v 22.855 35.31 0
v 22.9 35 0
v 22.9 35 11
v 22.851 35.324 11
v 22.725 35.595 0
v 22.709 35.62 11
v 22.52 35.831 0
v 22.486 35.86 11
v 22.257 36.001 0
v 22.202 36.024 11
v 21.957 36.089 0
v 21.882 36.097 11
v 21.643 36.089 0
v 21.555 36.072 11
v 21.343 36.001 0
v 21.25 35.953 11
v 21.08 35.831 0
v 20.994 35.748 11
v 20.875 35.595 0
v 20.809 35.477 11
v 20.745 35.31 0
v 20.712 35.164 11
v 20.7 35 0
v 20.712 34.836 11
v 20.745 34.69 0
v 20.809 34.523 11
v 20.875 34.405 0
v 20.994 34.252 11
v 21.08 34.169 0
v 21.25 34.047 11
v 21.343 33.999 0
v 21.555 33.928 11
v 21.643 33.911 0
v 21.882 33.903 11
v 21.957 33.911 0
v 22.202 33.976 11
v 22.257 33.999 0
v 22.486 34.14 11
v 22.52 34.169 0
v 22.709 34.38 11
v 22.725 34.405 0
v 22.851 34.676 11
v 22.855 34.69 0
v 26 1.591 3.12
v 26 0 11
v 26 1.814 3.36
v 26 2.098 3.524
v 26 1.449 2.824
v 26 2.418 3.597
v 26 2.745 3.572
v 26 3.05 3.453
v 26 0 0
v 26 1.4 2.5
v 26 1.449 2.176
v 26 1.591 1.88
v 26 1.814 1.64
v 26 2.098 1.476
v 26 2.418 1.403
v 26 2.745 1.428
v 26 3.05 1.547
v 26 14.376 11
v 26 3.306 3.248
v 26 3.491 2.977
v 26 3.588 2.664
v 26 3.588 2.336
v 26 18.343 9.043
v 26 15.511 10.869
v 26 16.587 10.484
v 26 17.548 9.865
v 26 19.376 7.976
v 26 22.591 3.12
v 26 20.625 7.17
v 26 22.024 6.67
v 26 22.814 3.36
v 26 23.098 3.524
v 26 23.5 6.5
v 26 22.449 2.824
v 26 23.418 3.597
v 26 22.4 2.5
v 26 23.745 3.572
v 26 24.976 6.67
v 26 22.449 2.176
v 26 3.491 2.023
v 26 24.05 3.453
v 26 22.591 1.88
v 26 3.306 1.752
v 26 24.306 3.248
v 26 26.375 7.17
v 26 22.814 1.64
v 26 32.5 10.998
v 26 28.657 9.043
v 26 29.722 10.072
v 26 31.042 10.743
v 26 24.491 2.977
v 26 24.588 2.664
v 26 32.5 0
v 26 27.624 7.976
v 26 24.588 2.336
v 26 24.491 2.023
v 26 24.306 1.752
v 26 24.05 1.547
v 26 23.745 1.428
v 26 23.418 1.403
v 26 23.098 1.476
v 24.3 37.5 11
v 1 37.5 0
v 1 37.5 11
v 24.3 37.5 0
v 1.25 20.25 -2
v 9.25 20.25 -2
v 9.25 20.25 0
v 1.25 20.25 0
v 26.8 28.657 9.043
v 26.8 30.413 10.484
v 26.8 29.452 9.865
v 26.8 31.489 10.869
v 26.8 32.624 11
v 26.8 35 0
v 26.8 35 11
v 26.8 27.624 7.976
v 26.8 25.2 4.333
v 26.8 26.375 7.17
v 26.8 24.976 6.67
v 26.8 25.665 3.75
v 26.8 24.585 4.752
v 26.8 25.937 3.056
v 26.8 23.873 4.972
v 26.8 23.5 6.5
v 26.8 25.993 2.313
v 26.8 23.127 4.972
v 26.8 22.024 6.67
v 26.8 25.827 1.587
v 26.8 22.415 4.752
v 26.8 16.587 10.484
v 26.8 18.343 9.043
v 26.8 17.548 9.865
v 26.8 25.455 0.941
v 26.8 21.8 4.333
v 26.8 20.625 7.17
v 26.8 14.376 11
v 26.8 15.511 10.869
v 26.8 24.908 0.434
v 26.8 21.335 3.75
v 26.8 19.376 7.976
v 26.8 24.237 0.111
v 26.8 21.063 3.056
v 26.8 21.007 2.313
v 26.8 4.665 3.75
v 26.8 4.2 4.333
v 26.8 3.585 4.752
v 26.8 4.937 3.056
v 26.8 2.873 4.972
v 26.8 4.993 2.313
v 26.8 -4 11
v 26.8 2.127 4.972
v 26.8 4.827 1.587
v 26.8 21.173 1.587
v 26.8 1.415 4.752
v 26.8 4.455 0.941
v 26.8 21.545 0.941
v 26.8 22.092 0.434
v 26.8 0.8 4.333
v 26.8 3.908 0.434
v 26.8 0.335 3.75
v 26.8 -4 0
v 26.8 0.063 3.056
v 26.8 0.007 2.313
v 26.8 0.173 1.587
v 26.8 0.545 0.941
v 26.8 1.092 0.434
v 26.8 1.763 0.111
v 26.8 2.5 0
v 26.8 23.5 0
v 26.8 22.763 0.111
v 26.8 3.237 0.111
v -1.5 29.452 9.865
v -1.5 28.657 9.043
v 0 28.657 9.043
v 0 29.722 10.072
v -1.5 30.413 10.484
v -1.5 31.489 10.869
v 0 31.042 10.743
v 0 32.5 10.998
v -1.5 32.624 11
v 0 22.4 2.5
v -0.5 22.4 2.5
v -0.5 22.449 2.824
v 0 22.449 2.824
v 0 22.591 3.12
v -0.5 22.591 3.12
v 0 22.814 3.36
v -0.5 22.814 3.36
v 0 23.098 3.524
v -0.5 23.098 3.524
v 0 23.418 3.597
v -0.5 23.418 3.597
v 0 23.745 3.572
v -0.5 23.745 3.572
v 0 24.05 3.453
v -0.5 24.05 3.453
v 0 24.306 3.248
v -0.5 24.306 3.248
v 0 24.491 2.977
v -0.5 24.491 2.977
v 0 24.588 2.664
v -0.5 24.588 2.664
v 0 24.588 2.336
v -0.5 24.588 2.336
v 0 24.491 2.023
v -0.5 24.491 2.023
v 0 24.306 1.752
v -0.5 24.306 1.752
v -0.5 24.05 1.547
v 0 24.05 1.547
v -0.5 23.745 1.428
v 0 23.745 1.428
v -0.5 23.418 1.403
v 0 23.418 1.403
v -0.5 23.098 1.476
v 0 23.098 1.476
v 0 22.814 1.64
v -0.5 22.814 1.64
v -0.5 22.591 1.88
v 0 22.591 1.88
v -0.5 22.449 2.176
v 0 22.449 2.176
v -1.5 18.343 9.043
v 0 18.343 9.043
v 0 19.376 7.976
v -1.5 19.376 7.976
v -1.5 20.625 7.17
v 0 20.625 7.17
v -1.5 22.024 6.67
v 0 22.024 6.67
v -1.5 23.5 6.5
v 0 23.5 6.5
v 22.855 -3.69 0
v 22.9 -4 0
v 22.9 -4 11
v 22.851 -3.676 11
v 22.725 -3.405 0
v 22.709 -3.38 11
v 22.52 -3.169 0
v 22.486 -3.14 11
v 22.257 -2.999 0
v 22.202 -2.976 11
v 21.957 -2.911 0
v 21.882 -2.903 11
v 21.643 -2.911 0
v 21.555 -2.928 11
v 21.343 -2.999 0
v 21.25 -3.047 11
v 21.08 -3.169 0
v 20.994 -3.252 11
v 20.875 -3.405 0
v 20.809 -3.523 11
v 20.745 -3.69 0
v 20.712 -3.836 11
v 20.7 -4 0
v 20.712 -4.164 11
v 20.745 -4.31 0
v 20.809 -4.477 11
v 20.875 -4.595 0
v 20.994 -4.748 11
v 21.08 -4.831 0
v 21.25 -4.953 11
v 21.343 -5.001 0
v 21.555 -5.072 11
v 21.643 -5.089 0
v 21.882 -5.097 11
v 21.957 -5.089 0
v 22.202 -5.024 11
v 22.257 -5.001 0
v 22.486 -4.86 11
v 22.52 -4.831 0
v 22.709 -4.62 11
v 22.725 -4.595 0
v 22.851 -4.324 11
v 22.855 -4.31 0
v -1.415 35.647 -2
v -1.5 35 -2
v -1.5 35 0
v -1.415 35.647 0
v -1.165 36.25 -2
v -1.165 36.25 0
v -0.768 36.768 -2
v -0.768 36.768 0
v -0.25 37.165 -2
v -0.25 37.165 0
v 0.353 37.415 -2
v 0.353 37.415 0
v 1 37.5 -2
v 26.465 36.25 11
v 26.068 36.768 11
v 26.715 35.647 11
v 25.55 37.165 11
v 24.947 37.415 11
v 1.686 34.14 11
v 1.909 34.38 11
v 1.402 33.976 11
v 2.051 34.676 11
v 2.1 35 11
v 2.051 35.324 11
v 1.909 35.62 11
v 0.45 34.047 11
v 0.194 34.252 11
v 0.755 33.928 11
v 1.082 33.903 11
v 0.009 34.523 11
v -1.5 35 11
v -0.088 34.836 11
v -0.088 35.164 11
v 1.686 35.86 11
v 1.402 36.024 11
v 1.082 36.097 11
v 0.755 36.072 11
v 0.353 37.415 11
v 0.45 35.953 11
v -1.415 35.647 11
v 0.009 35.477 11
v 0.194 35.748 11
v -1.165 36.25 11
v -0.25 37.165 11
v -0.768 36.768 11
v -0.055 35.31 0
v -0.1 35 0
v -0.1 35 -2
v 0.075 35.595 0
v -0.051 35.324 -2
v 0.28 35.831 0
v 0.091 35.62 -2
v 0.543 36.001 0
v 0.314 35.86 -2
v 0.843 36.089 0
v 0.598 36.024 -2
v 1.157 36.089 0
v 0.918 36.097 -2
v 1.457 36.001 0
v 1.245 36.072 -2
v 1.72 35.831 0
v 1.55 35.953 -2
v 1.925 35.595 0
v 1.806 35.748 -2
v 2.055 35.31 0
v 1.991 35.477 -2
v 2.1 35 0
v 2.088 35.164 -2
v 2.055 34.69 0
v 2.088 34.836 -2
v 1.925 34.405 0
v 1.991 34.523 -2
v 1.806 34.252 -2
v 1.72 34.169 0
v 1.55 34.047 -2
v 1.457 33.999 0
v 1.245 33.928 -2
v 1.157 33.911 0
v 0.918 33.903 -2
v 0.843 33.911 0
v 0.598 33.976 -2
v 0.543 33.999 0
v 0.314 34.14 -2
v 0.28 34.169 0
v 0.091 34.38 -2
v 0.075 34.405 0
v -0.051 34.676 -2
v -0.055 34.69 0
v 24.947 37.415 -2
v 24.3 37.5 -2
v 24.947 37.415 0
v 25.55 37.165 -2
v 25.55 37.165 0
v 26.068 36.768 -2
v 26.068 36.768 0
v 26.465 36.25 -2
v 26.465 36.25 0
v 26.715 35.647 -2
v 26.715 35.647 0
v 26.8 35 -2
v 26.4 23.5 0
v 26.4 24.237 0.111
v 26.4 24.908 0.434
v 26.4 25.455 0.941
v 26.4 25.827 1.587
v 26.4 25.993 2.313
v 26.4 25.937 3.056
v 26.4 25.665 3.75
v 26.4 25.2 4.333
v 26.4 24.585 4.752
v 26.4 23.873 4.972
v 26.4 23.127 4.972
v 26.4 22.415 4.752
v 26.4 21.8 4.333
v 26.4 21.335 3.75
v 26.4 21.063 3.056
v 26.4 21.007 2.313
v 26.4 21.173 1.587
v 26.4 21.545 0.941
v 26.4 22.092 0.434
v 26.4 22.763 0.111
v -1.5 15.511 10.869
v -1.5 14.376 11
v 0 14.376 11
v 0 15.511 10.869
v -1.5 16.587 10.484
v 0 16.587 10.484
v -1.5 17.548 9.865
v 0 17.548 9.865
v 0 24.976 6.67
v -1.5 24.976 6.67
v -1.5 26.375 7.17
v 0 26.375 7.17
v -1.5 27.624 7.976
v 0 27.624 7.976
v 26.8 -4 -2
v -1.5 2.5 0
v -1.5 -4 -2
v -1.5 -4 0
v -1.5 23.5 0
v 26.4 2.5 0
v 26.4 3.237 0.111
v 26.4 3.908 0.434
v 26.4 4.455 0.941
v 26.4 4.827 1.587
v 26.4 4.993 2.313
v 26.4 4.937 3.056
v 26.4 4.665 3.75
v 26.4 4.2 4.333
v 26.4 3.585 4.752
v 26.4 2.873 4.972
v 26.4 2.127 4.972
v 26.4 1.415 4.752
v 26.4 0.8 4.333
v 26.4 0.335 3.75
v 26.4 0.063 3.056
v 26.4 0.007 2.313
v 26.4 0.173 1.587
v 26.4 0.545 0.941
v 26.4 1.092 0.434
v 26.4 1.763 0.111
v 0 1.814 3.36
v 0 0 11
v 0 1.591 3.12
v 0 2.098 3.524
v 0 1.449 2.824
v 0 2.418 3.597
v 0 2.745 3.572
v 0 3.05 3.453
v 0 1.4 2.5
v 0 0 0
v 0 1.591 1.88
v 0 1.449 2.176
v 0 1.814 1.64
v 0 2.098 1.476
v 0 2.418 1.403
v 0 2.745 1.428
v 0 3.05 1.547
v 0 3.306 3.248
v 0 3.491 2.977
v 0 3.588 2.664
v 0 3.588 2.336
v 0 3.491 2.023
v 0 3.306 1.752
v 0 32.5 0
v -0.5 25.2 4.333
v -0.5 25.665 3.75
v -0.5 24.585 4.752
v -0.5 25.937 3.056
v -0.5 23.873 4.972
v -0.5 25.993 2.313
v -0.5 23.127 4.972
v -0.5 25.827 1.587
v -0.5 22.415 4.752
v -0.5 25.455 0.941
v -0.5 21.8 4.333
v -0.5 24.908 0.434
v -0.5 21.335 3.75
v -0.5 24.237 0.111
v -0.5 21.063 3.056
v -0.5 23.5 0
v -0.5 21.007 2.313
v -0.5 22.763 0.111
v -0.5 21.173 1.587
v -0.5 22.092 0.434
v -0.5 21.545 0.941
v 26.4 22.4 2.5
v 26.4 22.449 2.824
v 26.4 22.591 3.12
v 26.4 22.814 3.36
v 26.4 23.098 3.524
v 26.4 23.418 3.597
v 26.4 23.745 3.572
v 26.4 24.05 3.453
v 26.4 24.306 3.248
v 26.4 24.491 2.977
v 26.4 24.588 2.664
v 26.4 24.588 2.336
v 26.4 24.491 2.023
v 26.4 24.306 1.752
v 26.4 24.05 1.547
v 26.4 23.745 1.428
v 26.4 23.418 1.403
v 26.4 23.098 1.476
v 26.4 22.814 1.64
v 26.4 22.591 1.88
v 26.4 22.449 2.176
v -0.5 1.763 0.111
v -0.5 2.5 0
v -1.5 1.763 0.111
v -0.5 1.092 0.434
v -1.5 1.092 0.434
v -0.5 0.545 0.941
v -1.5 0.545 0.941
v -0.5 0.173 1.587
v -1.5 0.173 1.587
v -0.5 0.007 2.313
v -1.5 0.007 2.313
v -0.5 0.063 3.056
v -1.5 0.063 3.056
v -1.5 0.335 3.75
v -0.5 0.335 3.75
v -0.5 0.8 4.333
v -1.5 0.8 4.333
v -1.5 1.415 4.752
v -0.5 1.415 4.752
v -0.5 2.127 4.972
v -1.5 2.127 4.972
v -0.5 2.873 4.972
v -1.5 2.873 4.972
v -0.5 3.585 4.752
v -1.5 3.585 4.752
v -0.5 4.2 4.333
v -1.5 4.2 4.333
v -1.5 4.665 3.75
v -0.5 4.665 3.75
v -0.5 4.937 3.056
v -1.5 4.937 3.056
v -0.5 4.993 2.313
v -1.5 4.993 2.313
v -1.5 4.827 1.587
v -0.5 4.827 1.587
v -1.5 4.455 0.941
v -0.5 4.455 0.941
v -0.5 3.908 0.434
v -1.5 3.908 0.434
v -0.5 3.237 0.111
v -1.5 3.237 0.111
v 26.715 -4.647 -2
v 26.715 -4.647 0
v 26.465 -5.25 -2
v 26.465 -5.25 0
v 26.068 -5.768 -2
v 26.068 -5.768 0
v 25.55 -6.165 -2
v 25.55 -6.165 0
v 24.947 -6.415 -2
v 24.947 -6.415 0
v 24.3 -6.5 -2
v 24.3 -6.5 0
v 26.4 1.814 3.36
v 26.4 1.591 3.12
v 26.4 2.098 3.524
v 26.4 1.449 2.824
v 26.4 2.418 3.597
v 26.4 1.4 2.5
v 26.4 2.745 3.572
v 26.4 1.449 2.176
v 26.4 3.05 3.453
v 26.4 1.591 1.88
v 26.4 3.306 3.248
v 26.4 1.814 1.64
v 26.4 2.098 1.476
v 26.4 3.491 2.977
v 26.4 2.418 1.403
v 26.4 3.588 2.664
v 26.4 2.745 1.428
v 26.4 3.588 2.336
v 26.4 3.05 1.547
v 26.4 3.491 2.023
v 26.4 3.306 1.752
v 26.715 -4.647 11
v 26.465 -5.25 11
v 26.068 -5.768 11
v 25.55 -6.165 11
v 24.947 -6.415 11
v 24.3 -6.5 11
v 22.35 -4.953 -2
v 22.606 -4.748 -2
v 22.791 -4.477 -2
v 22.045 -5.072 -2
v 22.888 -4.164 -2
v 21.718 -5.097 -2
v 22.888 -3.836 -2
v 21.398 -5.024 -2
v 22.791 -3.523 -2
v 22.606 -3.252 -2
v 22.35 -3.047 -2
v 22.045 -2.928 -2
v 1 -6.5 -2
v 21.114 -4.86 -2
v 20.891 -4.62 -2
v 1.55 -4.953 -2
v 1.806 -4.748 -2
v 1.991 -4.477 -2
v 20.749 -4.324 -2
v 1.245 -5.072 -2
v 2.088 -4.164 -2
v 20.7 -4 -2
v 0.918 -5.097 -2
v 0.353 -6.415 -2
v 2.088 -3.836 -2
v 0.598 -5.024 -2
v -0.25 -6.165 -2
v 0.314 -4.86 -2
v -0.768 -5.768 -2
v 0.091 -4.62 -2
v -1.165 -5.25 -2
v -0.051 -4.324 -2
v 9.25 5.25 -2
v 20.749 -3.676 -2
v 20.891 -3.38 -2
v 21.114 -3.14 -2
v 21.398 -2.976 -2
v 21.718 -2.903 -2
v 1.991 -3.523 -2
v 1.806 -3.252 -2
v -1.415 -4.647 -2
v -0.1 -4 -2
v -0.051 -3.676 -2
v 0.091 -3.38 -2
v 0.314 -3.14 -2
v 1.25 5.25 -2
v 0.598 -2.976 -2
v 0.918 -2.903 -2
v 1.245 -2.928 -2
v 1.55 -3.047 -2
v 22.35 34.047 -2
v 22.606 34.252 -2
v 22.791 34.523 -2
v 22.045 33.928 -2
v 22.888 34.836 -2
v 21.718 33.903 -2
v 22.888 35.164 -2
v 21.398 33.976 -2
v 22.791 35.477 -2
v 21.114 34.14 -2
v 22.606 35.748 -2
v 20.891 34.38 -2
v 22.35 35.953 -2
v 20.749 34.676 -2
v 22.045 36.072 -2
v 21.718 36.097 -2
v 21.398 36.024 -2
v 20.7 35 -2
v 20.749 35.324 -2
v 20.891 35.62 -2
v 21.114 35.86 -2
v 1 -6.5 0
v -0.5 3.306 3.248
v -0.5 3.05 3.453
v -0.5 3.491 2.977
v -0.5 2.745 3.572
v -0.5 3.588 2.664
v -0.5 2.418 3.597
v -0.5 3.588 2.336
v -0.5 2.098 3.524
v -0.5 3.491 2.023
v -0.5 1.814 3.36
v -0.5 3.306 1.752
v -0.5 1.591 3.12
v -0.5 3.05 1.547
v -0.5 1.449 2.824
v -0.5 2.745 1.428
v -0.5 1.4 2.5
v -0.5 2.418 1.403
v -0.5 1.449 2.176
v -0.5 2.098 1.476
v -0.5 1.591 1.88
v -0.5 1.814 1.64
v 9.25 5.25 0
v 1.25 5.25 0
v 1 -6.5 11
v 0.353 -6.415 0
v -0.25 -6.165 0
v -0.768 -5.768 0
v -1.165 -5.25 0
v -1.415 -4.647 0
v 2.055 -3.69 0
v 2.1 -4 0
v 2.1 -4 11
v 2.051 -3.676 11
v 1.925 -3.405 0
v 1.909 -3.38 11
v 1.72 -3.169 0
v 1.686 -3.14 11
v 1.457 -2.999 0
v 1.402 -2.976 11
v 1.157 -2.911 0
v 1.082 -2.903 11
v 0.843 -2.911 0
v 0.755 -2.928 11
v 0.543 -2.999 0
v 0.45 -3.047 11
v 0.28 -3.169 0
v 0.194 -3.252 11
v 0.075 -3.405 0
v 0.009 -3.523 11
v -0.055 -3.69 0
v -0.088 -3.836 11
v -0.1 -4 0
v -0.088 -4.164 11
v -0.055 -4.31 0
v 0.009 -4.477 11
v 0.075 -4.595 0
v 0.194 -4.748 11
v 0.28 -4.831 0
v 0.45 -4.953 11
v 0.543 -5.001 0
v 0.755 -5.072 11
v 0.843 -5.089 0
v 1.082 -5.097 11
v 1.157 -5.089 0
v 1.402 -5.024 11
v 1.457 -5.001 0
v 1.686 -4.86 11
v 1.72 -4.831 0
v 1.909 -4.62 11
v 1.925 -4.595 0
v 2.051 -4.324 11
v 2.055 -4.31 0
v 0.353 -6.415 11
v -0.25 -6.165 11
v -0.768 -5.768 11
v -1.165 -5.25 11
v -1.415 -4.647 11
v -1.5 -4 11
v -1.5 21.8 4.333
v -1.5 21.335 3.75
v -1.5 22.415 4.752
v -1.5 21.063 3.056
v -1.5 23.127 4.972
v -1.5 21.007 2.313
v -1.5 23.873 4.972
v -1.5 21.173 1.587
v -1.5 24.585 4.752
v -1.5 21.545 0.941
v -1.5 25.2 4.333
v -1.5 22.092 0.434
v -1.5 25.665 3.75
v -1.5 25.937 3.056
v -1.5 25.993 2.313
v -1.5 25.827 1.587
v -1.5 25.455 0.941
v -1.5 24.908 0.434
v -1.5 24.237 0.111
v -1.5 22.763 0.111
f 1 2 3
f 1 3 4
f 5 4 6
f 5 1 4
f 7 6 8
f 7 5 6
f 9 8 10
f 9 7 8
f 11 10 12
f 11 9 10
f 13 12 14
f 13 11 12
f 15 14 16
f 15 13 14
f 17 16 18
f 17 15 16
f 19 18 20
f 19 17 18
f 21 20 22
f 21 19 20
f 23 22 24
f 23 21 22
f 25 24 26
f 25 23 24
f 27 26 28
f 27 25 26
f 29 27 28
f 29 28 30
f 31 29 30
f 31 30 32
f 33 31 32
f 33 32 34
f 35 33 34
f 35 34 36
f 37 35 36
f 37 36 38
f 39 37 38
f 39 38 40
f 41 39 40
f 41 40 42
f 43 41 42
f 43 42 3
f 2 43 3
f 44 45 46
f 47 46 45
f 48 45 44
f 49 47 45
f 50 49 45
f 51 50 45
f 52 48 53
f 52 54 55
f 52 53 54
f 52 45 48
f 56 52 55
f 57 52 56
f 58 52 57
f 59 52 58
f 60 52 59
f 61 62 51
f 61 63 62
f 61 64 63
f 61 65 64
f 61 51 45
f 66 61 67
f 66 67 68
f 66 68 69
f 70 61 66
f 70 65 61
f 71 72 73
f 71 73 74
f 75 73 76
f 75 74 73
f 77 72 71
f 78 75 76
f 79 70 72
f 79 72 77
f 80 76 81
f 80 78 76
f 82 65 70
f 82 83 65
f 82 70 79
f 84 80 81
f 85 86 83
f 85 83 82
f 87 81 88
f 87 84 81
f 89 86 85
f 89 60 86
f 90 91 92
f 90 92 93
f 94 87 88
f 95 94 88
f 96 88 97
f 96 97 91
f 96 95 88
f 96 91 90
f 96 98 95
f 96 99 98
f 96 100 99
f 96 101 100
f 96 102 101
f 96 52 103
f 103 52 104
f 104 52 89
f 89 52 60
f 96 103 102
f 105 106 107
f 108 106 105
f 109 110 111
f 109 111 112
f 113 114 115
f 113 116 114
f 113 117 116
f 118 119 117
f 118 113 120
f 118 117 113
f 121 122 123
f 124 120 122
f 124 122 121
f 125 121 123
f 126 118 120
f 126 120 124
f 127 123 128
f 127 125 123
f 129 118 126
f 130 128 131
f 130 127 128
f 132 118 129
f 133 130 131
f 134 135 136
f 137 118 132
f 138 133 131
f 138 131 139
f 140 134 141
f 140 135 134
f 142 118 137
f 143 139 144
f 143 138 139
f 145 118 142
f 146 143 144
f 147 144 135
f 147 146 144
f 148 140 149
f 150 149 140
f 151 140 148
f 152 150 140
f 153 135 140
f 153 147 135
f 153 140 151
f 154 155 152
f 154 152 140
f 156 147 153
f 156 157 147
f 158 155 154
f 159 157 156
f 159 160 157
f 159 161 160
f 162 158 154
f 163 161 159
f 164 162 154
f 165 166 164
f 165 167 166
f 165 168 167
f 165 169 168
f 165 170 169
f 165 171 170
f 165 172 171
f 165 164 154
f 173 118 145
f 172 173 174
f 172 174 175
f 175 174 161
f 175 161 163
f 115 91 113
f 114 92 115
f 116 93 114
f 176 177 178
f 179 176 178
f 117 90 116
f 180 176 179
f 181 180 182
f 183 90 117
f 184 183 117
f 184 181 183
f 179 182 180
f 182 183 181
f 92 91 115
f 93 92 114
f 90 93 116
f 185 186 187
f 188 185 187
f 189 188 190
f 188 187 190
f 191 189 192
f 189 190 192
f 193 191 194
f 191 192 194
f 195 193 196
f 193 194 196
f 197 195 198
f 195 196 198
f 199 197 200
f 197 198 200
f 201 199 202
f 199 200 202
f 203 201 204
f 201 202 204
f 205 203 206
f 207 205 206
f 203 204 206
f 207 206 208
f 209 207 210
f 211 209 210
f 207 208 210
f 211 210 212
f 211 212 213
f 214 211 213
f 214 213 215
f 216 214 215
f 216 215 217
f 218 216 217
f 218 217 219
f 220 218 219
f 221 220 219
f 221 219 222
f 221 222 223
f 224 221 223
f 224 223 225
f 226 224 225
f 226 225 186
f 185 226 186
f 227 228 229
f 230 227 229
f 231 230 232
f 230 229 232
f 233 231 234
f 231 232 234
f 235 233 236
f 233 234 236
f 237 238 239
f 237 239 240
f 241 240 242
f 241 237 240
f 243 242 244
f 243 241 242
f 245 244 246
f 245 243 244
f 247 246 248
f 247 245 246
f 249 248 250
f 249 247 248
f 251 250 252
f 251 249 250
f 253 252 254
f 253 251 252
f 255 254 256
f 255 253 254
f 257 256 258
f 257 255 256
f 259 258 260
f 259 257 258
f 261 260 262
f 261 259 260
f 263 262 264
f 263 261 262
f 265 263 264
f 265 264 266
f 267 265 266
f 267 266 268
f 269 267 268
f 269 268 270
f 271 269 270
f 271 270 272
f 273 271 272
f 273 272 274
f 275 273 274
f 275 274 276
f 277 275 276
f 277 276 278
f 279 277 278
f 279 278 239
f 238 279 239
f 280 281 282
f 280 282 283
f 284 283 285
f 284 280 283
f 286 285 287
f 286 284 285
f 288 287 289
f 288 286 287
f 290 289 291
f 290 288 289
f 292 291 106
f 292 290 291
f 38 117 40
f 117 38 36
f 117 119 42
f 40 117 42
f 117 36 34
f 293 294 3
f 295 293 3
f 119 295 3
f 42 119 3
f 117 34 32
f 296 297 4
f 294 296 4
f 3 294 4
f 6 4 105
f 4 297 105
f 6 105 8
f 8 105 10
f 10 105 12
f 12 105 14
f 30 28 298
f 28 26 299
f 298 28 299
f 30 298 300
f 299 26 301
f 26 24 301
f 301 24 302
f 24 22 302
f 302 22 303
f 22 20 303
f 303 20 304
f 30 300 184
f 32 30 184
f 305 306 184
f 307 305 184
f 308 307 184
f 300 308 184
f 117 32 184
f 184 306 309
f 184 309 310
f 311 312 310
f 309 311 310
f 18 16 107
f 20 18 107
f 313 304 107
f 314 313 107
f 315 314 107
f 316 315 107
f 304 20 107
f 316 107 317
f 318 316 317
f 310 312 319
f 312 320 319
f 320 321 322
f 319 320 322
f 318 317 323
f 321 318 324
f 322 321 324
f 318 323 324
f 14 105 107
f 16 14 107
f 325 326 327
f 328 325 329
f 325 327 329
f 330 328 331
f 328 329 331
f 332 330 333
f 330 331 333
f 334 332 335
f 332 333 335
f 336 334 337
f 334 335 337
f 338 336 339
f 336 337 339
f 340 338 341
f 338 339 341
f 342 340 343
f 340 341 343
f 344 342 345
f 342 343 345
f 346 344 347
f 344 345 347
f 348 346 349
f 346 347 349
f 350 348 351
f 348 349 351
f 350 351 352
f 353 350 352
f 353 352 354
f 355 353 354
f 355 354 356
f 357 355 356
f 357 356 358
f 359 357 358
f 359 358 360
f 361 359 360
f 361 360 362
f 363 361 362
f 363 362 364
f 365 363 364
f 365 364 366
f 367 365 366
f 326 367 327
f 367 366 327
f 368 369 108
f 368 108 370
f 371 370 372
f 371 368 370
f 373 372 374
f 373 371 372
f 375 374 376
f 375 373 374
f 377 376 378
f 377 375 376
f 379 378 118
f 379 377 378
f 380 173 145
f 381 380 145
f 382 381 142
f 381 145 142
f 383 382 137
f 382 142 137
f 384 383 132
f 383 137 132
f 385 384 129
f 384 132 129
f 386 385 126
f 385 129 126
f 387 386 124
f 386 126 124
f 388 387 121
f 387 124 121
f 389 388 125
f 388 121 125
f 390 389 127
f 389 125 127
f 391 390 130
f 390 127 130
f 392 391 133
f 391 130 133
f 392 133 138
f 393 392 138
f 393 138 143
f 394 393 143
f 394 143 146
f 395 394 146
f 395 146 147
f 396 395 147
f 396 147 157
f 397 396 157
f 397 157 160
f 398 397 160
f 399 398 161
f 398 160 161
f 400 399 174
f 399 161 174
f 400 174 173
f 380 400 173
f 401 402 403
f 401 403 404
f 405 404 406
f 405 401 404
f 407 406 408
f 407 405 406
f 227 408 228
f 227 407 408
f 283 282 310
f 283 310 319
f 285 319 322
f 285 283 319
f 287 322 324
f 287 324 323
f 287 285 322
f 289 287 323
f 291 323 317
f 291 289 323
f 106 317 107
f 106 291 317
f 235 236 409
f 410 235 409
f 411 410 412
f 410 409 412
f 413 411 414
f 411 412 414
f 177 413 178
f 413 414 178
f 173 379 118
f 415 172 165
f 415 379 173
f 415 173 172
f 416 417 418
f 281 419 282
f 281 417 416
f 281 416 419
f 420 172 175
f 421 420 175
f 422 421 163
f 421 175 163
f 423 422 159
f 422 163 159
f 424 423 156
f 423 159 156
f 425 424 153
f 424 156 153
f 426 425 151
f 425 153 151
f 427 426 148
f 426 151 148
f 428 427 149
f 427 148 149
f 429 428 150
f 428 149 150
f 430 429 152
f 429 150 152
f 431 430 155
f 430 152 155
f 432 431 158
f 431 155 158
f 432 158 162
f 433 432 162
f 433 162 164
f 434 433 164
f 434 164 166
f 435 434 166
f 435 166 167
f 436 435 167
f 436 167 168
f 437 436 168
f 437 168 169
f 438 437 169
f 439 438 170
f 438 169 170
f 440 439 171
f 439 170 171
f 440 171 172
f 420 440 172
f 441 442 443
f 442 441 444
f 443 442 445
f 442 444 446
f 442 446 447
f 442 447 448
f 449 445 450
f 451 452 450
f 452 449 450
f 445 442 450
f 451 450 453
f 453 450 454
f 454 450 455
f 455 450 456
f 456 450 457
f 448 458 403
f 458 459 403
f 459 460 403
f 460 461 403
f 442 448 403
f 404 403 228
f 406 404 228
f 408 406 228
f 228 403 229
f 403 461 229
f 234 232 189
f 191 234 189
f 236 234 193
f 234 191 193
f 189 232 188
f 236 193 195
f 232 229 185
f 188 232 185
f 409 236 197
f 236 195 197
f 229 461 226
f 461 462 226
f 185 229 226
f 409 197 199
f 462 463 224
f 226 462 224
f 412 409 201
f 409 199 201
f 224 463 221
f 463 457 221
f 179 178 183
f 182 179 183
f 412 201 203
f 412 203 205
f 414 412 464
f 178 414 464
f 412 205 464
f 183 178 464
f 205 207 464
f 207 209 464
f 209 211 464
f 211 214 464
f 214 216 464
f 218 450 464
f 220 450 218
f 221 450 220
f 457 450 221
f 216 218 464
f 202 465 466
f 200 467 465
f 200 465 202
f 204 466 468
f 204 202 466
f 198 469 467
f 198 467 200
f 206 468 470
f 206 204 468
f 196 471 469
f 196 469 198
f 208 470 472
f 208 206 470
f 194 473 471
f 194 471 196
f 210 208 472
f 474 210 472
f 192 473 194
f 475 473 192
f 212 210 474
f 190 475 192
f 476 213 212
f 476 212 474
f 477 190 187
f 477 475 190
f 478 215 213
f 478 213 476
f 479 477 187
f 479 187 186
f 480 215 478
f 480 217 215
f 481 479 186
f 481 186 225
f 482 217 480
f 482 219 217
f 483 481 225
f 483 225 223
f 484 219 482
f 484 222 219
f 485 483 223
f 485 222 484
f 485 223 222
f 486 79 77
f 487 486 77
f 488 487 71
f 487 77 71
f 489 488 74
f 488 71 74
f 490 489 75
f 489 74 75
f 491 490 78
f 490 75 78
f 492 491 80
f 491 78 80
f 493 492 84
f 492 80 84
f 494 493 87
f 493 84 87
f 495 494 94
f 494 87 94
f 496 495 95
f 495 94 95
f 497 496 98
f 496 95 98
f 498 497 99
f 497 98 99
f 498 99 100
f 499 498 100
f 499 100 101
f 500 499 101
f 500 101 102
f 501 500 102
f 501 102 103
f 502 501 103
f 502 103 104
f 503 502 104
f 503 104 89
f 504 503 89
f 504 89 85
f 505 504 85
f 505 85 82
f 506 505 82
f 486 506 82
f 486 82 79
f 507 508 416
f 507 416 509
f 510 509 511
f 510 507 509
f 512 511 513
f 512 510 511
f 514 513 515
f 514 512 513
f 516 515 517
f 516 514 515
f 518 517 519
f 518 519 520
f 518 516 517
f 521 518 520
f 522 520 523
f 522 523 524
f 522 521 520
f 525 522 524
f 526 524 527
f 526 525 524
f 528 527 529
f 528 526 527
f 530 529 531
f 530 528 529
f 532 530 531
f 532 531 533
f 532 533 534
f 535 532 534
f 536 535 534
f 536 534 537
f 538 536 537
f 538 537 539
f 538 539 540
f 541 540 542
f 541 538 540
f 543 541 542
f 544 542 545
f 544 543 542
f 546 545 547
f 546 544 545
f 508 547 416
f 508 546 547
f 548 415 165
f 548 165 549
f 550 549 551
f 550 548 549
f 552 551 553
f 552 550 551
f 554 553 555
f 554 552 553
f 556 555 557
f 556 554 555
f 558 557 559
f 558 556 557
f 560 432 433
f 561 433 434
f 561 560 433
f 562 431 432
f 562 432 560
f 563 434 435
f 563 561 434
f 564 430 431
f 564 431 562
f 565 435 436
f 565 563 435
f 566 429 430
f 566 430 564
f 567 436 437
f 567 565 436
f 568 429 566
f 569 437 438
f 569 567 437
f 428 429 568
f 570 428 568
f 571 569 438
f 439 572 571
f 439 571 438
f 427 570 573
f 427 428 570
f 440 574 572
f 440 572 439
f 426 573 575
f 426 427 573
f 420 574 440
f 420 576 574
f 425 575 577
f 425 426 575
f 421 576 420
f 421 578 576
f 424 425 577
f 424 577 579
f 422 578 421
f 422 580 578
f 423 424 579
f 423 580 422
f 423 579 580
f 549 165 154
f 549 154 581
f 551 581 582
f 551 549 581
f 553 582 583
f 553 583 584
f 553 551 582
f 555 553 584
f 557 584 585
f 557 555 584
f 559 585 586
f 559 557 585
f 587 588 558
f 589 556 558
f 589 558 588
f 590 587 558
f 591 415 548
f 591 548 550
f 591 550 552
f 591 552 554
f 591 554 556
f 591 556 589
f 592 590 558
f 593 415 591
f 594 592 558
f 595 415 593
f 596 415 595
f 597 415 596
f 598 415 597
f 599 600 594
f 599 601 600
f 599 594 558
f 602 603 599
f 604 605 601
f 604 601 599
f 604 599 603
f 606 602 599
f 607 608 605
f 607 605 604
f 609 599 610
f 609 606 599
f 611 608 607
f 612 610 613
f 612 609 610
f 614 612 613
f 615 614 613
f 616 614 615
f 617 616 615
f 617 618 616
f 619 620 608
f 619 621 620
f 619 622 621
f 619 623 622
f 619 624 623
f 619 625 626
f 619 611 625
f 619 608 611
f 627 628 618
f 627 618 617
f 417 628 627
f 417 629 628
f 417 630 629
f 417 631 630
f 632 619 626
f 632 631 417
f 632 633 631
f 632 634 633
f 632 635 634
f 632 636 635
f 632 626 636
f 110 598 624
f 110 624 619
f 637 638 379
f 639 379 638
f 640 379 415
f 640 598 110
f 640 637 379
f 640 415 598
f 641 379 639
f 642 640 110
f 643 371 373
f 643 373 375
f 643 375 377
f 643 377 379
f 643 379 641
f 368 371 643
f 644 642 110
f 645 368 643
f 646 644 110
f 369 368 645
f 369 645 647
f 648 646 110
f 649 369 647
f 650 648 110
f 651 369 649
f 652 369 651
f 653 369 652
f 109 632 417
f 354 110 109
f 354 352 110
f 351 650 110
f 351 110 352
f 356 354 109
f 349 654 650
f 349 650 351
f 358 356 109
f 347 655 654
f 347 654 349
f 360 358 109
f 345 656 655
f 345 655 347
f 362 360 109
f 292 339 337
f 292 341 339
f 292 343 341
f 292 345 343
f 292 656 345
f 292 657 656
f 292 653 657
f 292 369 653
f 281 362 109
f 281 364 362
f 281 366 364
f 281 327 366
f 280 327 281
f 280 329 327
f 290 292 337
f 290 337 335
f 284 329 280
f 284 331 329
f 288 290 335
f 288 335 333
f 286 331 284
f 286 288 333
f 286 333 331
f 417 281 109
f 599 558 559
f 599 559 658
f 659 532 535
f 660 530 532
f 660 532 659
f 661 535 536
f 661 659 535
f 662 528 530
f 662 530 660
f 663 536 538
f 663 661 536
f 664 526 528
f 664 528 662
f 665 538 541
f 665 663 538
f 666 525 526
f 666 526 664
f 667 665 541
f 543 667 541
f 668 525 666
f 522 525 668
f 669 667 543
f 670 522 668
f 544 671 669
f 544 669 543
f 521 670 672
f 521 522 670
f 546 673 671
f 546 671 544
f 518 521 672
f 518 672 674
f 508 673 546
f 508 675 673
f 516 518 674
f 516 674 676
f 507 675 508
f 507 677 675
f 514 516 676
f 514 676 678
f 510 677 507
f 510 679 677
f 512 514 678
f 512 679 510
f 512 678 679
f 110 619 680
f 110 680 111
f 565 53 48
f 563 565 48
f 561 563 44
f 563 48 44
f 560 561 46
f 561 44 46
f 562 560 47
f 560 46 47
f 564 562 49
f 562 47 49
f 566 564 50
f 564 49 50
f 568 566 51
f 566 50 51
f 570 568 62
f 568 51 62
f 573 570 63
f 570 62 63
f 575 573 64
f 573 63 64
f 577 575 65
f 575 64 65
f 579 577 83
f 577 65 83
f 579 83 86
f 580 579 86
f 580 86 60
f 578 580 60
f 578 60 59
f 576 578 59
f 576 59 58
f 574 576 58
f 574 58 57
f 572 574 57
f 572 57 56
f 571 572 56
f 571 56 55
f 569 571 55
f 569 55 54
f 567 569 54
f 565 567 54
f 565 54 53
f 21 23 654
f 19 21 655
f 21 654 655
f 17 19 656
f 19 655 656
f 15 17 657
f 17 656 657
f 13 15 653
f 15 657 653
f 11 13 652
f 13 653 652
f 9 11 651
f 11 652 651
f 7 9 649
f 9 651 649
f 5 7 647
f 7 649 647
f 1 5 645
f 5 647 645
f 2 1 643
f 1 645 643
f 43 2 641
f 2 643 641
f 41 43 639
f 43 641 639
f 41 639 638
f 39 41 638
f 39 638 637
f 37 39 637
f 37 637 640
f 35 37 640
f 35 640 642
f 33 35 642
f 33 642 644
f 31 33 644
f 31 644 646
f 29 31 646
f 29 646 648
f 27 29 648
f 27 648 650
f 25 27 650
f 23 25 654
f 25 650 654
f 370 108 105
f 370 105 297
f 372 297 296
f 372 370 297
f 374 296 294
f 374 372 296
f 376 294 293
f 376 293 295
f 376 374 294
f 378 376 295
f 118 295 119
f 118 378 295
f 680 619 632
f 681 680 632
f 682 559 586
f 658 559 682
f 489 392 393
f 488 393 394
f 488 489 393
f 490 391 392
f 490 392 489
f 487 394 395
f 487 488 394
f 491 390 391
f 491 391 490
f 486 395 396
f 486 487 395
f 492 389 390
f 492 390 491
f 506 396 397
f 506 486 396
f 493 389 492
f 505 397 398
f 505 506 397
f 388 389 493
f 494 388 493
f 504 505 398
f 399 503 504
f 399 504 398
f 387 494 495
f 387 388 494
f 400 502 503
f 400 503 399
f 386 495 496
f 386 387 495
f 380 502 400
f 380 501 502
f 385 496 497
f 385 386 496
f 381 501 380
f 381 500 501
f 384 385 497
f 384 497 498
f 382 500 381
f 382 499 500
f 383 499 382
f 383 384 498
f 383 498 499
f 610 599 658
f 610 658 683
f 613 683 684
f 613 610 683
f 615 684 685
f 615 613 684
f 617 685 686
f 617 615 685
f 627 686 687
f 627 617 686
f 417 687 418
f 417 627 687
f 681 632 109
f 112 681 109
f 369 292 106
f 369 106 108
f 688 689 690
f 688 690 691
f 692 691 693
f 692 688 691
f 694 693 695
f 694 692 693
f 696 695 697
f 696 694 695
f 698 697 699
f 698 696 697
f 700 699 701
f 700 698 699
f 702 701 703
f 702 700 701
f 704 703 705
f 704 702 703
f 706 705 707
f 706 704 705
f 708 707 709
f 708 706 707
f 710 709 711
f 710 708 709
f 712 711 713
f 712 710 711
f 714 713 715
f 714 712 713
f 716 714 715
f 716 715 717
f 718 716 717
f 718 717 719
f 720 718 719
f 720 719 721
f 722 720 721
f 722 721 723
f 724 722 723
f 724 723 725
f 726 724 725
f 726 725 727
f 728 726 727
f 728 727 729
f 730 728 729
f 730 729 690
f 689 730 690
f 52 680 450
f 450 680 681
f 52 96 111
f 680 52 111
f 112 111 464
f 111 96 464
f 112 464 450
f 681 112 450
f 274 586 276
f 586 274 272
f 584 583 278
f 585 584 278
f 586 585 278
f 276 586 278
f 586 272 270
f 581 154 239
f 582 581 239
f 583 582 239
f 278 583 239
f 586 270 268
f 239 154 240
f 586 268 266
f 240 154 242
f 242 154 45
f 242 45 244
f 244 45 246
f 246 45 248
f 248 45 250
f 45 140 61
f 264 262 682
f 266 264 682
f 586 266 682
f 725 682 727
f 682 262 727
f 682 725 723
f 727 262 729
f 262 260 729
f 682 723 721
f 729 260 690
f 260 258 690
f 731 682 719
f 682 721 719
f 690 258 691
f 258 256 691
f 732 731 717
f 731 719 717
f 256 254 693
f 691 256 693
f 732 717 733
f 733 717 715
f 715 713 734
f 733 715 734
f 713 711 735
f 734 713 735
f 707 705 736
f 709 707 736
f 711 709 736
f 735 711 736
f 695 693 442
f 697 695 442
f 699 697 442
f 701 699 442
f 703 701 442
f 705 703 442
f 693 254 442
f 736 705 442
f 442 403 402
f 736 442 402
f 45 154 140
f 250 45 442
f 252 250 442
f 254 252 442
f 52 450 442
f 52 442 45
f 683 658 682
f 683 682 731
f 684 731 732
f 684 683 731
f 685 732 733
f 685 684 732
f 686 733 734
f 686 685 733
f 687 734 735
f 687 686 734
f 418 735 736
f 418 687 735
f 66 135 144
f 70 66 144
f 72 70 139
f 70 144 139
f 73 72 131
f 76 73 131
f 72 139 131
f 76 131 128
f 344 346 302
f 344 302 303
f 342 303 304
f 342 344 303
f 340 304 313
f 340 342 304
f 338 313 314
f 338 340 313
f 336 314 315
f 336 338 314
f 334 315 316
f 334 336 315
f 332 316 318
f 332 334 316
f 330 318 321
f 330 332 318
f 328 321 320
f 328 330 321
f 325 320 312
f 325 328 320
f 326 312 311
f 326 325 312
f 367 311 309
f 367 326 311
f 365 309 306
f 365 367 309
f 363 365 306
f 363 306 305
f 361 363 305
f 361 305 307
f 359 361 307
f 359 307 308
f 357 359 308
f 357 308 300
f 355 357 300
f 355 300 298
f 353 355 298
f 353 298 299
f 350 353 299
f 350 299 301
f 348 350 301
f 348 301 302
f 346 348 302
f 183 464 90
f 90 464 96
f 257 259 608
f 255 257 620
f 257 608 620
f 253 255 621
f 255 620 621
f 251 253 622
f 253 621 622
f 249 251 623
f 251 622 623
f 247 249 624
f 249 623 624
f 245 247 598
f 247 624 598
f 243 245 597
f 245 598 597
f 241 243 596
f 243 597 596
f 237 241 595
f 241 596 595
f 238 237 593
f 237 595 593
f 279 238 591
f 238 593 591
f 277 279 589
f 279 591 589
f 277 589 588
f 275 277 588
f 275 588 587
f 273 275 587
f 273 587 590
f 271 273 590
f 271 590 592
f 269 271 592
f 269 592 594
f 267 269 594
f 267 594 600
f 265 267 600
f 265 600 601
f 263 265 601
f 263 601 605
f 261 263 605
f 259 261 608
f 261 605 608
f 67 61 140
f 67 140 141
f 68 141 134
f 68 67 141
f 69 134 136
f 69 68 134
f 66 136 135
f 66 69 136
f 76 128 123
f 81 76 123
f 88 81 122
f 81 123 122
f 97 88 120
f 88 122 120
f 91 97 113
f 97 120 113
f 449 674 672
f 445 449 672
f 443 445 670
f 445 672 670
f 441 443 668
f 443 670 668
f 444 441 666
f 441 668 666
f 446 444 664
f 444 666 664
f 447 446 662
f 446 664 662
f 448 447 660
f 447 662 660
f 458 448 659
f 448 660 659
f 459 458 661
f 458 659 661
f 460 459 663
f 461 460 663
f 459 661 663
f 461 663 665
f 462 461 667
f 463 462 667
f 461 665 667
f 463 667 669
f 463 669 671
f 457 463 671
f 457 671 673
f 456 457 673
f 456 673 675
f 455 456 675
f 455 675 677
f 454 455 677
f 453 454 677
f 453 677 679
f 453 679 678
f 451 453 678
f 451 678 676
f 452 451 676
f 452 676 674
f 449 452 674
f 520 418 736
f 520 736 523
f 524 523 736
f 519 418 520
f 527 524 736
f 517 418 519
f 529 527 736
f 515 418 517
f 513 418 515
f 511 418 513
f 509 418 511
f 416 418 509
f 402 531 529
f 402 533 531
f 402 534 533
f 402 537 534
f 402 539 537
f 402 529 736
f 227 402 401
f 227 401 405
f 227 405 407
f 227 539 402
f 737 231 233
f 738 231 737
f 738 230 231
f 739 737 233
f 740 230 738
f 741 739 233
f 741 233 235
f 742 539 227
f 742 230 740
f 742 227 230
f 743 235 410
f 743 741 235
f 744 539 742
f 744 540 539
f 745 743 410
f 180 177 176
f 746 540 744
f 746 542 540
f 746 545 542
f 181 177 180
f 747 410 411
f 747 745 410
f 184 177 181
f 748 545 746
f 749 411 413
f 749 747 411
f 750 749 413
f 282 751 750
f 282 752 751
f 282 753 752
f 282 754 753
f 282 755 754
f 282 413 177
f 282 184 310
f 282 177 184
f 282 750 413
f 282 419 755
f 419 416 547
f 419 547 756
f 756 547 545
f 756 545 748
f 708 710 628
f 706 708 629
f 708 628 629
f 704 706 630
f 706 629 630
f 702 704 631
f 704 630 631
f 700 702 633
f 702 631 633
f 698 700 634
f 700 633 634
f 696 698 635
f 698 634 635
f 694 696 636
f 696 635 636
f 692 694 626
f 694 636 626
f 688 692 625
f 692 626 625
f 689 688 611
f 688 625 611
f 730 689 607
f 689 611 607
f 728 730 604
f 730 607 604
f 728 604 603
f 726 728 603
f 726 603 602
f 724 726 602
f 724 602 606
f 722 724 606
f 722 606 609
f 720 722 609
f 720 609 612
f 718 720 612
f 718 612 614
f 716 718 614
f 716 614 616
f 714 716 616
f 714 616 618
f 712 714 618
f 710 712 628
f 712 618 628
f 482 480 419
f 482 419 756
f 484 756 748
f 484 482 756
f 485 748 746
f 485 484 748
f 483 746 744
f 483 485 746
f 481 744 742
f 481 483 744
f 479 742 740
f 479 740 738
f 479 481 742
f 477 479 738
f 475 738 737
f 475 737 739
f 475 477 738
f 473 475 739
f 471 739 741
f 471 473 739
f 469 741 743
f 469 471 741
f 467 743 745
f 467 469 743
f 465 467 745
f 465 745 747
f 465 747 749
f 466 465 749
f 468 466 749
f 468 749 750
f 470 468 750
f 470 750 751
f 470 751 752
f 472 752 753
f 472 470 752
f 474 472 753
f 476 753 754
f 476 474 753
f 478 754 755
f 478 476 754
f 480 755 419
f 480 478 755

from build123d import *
from build123d.topology import SkipClean

# Parameters (mm, degrees)
SKETCH_1_R          = 1.1
SKETCH_1_W          = 26
SKETCH_1_H          = 32.5
EXTRUDE_1_DEPTH     = 11
EXTRUDE_START       = 2
SKETCH_3_R          = 1.1
EXTRUDE_2_DEPTH     = 2
SKETCH_2_R          = 1.1
CUT_EXTRUDE_1_DEPTH = 49.250803102
SKETCH_4_W          = 8
SKETCH_4_H          = 15
CUT_EXTRUDE_3_DEPTH = 10
SKETCH_5_R          = 6.5
CUT_EXTRUDE_4_DEPTH = 49.250803102
FILLET_START        = -2
FILLET_1_DEPTH      = 30
SKETCH_6_R          = 2.5
CUT_EXTRUDE_5_DEPTH = 0.4
CUT_EXTRUDE_START   = -1
SKETCH_7_R          = 2.5
CUT_EXTRUDE_6_DEPTH = 1


with BuildPart() as part:
    # ｽｹｯﾁ1 → ﾎﾞｽ - 押し出し1 (new body)
    with BuildSketch(Plane.XY):
        with BuildLine():
            Line((26.8, 35), (26.8, -4))
            ThreePointArc((26.8, -4), (26.067766953, -5.767766953), (24.3, -6.5))
            Line((24.3, -6.5), (1, -6.5))
            ThreePointArc((1, -6.5), (-0.767766953, -5.767766953), (-1.5, -4))
            Line((-1.5, -4), (-1.5, 35))
            ThreePointArc((-1.5, 35), (-0.767766953, 36.767766953), (1, 37.5))
            Line((1, 37.5), (24.3, 37.5))
            ThreePointArc((24.3, 37.5), (26.067766953, 36.767766953), (26.8, 35))
        make_face()
        with Locations((21.8, 35)):
            Circle(SKETCH_1_R, mode=Mode.SUBTRACT)
        with Locations((1, 35)):
            Circle(SKETCH_1_R, mode=Mode.SUBTRACT)
        with Locations((1, -4)):
            Circle(SKETCH_1_R, mode=Mode.SUBTRACT)
        with Locations((21.8, -4)):
            Circle(SKETCH_1_R, mode=Mode.SUBTRACT)
        with Locations((13, 16.25)):
            Rectangle(SKETCH_1_W, SKETCH_1_H, mode=Mode.SUBTRACT)
    extrude(amount=EXTRUDE_1_DEPTH)

    # ｽｹｯﾁ3 → ﾎﾞｽ - 押し出し2 (add)
    with SkipClean():  # the faces are left unmerged after this step: merging them gives an invalid solid
        with BuildSketch(Plane(origin=(0, 0, 0), x_dir=(-1, 0, 0), z_dir=(0, 0, -1)).offset(EXTRUDE_START)):
            with BuildLine():
                Line((1.5, -4), (1.5, 35))
                ThreePointArc((1.5, 35), (0.767766953, 36.767766953), (-1, 37.5))
                Line((-1, 37.5), (-24.3, 37.5))
                ThreePointArc((-24.3, 37.5), (-26.067766953, 36.767766953), (-26.8, 35))
                Line((-26.8, 35), (-26.8, -4))
                ThreePointArc((-26.8, -4), (-26.067766953, -5.767766953), (-24.3, -6.5))
                Line((-24.3, -6.5), (-1, -6.5))
                ThreePointArc((-1, -6.5), (0.767766953, -5.767766953), (1.5, -4))
            make_face()
            with Locations((-21.8, -4)):
                Circle(SKETCH_3_R, mode=Mode.SUBTRACT)
            with Locations((-1, -4)):
                Circle(SKETCH_3_R, mode=Mode.SUBTRACT)
            with Locations((-1, 35)):
                Circle(SKETCH_3_R, mode=Mode.SUBTRACT)
            with Locations((-21.8, 35)):
                Circle(SKETCH_3_R, mode=Mode.SUBTRACT)
        extrude(amount=-EXTRUDE_2_DEPTH)

    # ｽｹｯﾁ2 → ｶｯﾄ - 押し出し1 (cut, through all)
    with SkipClean():  # the faces are left unmerged after this step: merging them gives an invalid solid
        with BuildSketch(Plane.ZY.offset(1.5)):
            with Locations(Location((2.5, 23.5, 0), (0, 0, 270))):
                Circle(SKETCH_2_R)
            with Locations(Location((2.5, 2.5, 0), (0, 0, 270))):
                Circle(SKETCH_2_R)
        extrude(amount=-CUT_EXTRUDE_1_DEPTH, mode=Mode.SUBTRACT)

    # ｽｹｯﾁ4 → ｶｯﾄ - 押し出し3 (cut)
    with SkipClean():  # the faces are left unmerged after this step: merging them gives an invalid solid
        with BuildSketch(Plane(origin=(0, 0, -2), x_dir=(-1, 0, 0), z_dir=(0, 0, -1))):
            with Locations((-5.25, 12.75)):
                Rectangle(SKETCH_4_W, SKETCH_4_H)
        extrude(amount=-CUT_EXTRUDE_3_DEPTH, mode=Mode.SUBTRACT)

    # ｽｹｯﾁ5 → ｶｯﾄ - 押し出し4 (cut, through all)
    with SkipClean():  # the faces are left unmerged after this step: merging them gives an invalid solid
        with BuildSketch(Plane(origin=(26.8, 0, 0), x_dir=(0, 0, -1), z_dir=(1, 0, 0))):
            with Locations((-13, 23.5)):
                Circle(SKETCH_5_R)
        extrude(amount=-CUT_EXTRUDE_4_DEPTH, mode=Mode.SUBTRACT)

    # ﾌｨﾚｯﾄ1: read off the stored shape, not the designer's step
    # ﾌｨﾚｯﾄ1 outline → ﾌｨﾚｯﾄ1 (cut)
    with SkipClean():  # the faces are left unmerged after this step: merging them gives an invalid solid
        with BuildSketch(Plane.YZ.offset(FILLET_START)):
            with BuildLine():
                ThreePointArc((14.375856205, 11), (16.587485547, 10.484272031), (18.342875246, 9.043478261))
                ThreePointArc((18.342875246, 9.043478261), (17.745349201, 9.977750147), (17.315341562, 11))
                Line((17.315341562, 11), (14.375856205, 11))
            make_face()
            with BuildLine():
                ThreePointArc((29.684658438, 11), (29.254650799, 9.977750147), (28.657124754, 9.043478261))
                ThreePointArc((28.657124754, 9.043478261), (30.412514453, 10.484272031), (32.624143795, 11))
                Line((32.624143795, 11), (29.684658438, 11))
            make_face()
        extrude(amount=FILLET_1_DEPTH, mode=Mode.SUBTRACT)

    # ｽｹｯﾁ6 → ｶｯﾄ - 押し出し5 (cut)
    with SkipClean():  # the faces are left unmerged after this step: merging them gives an invalid solid
        with BuildSketch(Plane(origin=(26.8, 0, 0), x_dir=(0, 0, -1), z_dir=(1, 0, 0))):
            with Locations((-2.5, 2.5)):
                Circle(SKETCH_6_R)
            with Locations((-2.5, 23.5)):
                Circle(SKETCH_6_R)
        extrude(amount=-CUT_EXTRUDE_5_DEPTH, mode=Mode.SUBTRACT)

    # ｽｹｯﾁ7 → ｶｯﾄ - 押し出し6 (cut)
    with SkipClean():  # the faces are left unmerged after this step: merging them gives an invalid solid
        with BuildSketch(Plane.ZY.offset(1.5).offset(CUT_EXTRUDE_START)):
            with Locations(Location((2.5, 2.5, 0), (0, 0, 180))):
                Circle(SKETCH_7_R)
            with Locations(Location((2.5, 23.5, 0), (0, 0, 180))):
                Circle(SKETCH_7_R)
        extrude(amount=CUT_EXTRUDE_6_DEPTH, mode=Mode.SUBTRACT)


solid = part.part
